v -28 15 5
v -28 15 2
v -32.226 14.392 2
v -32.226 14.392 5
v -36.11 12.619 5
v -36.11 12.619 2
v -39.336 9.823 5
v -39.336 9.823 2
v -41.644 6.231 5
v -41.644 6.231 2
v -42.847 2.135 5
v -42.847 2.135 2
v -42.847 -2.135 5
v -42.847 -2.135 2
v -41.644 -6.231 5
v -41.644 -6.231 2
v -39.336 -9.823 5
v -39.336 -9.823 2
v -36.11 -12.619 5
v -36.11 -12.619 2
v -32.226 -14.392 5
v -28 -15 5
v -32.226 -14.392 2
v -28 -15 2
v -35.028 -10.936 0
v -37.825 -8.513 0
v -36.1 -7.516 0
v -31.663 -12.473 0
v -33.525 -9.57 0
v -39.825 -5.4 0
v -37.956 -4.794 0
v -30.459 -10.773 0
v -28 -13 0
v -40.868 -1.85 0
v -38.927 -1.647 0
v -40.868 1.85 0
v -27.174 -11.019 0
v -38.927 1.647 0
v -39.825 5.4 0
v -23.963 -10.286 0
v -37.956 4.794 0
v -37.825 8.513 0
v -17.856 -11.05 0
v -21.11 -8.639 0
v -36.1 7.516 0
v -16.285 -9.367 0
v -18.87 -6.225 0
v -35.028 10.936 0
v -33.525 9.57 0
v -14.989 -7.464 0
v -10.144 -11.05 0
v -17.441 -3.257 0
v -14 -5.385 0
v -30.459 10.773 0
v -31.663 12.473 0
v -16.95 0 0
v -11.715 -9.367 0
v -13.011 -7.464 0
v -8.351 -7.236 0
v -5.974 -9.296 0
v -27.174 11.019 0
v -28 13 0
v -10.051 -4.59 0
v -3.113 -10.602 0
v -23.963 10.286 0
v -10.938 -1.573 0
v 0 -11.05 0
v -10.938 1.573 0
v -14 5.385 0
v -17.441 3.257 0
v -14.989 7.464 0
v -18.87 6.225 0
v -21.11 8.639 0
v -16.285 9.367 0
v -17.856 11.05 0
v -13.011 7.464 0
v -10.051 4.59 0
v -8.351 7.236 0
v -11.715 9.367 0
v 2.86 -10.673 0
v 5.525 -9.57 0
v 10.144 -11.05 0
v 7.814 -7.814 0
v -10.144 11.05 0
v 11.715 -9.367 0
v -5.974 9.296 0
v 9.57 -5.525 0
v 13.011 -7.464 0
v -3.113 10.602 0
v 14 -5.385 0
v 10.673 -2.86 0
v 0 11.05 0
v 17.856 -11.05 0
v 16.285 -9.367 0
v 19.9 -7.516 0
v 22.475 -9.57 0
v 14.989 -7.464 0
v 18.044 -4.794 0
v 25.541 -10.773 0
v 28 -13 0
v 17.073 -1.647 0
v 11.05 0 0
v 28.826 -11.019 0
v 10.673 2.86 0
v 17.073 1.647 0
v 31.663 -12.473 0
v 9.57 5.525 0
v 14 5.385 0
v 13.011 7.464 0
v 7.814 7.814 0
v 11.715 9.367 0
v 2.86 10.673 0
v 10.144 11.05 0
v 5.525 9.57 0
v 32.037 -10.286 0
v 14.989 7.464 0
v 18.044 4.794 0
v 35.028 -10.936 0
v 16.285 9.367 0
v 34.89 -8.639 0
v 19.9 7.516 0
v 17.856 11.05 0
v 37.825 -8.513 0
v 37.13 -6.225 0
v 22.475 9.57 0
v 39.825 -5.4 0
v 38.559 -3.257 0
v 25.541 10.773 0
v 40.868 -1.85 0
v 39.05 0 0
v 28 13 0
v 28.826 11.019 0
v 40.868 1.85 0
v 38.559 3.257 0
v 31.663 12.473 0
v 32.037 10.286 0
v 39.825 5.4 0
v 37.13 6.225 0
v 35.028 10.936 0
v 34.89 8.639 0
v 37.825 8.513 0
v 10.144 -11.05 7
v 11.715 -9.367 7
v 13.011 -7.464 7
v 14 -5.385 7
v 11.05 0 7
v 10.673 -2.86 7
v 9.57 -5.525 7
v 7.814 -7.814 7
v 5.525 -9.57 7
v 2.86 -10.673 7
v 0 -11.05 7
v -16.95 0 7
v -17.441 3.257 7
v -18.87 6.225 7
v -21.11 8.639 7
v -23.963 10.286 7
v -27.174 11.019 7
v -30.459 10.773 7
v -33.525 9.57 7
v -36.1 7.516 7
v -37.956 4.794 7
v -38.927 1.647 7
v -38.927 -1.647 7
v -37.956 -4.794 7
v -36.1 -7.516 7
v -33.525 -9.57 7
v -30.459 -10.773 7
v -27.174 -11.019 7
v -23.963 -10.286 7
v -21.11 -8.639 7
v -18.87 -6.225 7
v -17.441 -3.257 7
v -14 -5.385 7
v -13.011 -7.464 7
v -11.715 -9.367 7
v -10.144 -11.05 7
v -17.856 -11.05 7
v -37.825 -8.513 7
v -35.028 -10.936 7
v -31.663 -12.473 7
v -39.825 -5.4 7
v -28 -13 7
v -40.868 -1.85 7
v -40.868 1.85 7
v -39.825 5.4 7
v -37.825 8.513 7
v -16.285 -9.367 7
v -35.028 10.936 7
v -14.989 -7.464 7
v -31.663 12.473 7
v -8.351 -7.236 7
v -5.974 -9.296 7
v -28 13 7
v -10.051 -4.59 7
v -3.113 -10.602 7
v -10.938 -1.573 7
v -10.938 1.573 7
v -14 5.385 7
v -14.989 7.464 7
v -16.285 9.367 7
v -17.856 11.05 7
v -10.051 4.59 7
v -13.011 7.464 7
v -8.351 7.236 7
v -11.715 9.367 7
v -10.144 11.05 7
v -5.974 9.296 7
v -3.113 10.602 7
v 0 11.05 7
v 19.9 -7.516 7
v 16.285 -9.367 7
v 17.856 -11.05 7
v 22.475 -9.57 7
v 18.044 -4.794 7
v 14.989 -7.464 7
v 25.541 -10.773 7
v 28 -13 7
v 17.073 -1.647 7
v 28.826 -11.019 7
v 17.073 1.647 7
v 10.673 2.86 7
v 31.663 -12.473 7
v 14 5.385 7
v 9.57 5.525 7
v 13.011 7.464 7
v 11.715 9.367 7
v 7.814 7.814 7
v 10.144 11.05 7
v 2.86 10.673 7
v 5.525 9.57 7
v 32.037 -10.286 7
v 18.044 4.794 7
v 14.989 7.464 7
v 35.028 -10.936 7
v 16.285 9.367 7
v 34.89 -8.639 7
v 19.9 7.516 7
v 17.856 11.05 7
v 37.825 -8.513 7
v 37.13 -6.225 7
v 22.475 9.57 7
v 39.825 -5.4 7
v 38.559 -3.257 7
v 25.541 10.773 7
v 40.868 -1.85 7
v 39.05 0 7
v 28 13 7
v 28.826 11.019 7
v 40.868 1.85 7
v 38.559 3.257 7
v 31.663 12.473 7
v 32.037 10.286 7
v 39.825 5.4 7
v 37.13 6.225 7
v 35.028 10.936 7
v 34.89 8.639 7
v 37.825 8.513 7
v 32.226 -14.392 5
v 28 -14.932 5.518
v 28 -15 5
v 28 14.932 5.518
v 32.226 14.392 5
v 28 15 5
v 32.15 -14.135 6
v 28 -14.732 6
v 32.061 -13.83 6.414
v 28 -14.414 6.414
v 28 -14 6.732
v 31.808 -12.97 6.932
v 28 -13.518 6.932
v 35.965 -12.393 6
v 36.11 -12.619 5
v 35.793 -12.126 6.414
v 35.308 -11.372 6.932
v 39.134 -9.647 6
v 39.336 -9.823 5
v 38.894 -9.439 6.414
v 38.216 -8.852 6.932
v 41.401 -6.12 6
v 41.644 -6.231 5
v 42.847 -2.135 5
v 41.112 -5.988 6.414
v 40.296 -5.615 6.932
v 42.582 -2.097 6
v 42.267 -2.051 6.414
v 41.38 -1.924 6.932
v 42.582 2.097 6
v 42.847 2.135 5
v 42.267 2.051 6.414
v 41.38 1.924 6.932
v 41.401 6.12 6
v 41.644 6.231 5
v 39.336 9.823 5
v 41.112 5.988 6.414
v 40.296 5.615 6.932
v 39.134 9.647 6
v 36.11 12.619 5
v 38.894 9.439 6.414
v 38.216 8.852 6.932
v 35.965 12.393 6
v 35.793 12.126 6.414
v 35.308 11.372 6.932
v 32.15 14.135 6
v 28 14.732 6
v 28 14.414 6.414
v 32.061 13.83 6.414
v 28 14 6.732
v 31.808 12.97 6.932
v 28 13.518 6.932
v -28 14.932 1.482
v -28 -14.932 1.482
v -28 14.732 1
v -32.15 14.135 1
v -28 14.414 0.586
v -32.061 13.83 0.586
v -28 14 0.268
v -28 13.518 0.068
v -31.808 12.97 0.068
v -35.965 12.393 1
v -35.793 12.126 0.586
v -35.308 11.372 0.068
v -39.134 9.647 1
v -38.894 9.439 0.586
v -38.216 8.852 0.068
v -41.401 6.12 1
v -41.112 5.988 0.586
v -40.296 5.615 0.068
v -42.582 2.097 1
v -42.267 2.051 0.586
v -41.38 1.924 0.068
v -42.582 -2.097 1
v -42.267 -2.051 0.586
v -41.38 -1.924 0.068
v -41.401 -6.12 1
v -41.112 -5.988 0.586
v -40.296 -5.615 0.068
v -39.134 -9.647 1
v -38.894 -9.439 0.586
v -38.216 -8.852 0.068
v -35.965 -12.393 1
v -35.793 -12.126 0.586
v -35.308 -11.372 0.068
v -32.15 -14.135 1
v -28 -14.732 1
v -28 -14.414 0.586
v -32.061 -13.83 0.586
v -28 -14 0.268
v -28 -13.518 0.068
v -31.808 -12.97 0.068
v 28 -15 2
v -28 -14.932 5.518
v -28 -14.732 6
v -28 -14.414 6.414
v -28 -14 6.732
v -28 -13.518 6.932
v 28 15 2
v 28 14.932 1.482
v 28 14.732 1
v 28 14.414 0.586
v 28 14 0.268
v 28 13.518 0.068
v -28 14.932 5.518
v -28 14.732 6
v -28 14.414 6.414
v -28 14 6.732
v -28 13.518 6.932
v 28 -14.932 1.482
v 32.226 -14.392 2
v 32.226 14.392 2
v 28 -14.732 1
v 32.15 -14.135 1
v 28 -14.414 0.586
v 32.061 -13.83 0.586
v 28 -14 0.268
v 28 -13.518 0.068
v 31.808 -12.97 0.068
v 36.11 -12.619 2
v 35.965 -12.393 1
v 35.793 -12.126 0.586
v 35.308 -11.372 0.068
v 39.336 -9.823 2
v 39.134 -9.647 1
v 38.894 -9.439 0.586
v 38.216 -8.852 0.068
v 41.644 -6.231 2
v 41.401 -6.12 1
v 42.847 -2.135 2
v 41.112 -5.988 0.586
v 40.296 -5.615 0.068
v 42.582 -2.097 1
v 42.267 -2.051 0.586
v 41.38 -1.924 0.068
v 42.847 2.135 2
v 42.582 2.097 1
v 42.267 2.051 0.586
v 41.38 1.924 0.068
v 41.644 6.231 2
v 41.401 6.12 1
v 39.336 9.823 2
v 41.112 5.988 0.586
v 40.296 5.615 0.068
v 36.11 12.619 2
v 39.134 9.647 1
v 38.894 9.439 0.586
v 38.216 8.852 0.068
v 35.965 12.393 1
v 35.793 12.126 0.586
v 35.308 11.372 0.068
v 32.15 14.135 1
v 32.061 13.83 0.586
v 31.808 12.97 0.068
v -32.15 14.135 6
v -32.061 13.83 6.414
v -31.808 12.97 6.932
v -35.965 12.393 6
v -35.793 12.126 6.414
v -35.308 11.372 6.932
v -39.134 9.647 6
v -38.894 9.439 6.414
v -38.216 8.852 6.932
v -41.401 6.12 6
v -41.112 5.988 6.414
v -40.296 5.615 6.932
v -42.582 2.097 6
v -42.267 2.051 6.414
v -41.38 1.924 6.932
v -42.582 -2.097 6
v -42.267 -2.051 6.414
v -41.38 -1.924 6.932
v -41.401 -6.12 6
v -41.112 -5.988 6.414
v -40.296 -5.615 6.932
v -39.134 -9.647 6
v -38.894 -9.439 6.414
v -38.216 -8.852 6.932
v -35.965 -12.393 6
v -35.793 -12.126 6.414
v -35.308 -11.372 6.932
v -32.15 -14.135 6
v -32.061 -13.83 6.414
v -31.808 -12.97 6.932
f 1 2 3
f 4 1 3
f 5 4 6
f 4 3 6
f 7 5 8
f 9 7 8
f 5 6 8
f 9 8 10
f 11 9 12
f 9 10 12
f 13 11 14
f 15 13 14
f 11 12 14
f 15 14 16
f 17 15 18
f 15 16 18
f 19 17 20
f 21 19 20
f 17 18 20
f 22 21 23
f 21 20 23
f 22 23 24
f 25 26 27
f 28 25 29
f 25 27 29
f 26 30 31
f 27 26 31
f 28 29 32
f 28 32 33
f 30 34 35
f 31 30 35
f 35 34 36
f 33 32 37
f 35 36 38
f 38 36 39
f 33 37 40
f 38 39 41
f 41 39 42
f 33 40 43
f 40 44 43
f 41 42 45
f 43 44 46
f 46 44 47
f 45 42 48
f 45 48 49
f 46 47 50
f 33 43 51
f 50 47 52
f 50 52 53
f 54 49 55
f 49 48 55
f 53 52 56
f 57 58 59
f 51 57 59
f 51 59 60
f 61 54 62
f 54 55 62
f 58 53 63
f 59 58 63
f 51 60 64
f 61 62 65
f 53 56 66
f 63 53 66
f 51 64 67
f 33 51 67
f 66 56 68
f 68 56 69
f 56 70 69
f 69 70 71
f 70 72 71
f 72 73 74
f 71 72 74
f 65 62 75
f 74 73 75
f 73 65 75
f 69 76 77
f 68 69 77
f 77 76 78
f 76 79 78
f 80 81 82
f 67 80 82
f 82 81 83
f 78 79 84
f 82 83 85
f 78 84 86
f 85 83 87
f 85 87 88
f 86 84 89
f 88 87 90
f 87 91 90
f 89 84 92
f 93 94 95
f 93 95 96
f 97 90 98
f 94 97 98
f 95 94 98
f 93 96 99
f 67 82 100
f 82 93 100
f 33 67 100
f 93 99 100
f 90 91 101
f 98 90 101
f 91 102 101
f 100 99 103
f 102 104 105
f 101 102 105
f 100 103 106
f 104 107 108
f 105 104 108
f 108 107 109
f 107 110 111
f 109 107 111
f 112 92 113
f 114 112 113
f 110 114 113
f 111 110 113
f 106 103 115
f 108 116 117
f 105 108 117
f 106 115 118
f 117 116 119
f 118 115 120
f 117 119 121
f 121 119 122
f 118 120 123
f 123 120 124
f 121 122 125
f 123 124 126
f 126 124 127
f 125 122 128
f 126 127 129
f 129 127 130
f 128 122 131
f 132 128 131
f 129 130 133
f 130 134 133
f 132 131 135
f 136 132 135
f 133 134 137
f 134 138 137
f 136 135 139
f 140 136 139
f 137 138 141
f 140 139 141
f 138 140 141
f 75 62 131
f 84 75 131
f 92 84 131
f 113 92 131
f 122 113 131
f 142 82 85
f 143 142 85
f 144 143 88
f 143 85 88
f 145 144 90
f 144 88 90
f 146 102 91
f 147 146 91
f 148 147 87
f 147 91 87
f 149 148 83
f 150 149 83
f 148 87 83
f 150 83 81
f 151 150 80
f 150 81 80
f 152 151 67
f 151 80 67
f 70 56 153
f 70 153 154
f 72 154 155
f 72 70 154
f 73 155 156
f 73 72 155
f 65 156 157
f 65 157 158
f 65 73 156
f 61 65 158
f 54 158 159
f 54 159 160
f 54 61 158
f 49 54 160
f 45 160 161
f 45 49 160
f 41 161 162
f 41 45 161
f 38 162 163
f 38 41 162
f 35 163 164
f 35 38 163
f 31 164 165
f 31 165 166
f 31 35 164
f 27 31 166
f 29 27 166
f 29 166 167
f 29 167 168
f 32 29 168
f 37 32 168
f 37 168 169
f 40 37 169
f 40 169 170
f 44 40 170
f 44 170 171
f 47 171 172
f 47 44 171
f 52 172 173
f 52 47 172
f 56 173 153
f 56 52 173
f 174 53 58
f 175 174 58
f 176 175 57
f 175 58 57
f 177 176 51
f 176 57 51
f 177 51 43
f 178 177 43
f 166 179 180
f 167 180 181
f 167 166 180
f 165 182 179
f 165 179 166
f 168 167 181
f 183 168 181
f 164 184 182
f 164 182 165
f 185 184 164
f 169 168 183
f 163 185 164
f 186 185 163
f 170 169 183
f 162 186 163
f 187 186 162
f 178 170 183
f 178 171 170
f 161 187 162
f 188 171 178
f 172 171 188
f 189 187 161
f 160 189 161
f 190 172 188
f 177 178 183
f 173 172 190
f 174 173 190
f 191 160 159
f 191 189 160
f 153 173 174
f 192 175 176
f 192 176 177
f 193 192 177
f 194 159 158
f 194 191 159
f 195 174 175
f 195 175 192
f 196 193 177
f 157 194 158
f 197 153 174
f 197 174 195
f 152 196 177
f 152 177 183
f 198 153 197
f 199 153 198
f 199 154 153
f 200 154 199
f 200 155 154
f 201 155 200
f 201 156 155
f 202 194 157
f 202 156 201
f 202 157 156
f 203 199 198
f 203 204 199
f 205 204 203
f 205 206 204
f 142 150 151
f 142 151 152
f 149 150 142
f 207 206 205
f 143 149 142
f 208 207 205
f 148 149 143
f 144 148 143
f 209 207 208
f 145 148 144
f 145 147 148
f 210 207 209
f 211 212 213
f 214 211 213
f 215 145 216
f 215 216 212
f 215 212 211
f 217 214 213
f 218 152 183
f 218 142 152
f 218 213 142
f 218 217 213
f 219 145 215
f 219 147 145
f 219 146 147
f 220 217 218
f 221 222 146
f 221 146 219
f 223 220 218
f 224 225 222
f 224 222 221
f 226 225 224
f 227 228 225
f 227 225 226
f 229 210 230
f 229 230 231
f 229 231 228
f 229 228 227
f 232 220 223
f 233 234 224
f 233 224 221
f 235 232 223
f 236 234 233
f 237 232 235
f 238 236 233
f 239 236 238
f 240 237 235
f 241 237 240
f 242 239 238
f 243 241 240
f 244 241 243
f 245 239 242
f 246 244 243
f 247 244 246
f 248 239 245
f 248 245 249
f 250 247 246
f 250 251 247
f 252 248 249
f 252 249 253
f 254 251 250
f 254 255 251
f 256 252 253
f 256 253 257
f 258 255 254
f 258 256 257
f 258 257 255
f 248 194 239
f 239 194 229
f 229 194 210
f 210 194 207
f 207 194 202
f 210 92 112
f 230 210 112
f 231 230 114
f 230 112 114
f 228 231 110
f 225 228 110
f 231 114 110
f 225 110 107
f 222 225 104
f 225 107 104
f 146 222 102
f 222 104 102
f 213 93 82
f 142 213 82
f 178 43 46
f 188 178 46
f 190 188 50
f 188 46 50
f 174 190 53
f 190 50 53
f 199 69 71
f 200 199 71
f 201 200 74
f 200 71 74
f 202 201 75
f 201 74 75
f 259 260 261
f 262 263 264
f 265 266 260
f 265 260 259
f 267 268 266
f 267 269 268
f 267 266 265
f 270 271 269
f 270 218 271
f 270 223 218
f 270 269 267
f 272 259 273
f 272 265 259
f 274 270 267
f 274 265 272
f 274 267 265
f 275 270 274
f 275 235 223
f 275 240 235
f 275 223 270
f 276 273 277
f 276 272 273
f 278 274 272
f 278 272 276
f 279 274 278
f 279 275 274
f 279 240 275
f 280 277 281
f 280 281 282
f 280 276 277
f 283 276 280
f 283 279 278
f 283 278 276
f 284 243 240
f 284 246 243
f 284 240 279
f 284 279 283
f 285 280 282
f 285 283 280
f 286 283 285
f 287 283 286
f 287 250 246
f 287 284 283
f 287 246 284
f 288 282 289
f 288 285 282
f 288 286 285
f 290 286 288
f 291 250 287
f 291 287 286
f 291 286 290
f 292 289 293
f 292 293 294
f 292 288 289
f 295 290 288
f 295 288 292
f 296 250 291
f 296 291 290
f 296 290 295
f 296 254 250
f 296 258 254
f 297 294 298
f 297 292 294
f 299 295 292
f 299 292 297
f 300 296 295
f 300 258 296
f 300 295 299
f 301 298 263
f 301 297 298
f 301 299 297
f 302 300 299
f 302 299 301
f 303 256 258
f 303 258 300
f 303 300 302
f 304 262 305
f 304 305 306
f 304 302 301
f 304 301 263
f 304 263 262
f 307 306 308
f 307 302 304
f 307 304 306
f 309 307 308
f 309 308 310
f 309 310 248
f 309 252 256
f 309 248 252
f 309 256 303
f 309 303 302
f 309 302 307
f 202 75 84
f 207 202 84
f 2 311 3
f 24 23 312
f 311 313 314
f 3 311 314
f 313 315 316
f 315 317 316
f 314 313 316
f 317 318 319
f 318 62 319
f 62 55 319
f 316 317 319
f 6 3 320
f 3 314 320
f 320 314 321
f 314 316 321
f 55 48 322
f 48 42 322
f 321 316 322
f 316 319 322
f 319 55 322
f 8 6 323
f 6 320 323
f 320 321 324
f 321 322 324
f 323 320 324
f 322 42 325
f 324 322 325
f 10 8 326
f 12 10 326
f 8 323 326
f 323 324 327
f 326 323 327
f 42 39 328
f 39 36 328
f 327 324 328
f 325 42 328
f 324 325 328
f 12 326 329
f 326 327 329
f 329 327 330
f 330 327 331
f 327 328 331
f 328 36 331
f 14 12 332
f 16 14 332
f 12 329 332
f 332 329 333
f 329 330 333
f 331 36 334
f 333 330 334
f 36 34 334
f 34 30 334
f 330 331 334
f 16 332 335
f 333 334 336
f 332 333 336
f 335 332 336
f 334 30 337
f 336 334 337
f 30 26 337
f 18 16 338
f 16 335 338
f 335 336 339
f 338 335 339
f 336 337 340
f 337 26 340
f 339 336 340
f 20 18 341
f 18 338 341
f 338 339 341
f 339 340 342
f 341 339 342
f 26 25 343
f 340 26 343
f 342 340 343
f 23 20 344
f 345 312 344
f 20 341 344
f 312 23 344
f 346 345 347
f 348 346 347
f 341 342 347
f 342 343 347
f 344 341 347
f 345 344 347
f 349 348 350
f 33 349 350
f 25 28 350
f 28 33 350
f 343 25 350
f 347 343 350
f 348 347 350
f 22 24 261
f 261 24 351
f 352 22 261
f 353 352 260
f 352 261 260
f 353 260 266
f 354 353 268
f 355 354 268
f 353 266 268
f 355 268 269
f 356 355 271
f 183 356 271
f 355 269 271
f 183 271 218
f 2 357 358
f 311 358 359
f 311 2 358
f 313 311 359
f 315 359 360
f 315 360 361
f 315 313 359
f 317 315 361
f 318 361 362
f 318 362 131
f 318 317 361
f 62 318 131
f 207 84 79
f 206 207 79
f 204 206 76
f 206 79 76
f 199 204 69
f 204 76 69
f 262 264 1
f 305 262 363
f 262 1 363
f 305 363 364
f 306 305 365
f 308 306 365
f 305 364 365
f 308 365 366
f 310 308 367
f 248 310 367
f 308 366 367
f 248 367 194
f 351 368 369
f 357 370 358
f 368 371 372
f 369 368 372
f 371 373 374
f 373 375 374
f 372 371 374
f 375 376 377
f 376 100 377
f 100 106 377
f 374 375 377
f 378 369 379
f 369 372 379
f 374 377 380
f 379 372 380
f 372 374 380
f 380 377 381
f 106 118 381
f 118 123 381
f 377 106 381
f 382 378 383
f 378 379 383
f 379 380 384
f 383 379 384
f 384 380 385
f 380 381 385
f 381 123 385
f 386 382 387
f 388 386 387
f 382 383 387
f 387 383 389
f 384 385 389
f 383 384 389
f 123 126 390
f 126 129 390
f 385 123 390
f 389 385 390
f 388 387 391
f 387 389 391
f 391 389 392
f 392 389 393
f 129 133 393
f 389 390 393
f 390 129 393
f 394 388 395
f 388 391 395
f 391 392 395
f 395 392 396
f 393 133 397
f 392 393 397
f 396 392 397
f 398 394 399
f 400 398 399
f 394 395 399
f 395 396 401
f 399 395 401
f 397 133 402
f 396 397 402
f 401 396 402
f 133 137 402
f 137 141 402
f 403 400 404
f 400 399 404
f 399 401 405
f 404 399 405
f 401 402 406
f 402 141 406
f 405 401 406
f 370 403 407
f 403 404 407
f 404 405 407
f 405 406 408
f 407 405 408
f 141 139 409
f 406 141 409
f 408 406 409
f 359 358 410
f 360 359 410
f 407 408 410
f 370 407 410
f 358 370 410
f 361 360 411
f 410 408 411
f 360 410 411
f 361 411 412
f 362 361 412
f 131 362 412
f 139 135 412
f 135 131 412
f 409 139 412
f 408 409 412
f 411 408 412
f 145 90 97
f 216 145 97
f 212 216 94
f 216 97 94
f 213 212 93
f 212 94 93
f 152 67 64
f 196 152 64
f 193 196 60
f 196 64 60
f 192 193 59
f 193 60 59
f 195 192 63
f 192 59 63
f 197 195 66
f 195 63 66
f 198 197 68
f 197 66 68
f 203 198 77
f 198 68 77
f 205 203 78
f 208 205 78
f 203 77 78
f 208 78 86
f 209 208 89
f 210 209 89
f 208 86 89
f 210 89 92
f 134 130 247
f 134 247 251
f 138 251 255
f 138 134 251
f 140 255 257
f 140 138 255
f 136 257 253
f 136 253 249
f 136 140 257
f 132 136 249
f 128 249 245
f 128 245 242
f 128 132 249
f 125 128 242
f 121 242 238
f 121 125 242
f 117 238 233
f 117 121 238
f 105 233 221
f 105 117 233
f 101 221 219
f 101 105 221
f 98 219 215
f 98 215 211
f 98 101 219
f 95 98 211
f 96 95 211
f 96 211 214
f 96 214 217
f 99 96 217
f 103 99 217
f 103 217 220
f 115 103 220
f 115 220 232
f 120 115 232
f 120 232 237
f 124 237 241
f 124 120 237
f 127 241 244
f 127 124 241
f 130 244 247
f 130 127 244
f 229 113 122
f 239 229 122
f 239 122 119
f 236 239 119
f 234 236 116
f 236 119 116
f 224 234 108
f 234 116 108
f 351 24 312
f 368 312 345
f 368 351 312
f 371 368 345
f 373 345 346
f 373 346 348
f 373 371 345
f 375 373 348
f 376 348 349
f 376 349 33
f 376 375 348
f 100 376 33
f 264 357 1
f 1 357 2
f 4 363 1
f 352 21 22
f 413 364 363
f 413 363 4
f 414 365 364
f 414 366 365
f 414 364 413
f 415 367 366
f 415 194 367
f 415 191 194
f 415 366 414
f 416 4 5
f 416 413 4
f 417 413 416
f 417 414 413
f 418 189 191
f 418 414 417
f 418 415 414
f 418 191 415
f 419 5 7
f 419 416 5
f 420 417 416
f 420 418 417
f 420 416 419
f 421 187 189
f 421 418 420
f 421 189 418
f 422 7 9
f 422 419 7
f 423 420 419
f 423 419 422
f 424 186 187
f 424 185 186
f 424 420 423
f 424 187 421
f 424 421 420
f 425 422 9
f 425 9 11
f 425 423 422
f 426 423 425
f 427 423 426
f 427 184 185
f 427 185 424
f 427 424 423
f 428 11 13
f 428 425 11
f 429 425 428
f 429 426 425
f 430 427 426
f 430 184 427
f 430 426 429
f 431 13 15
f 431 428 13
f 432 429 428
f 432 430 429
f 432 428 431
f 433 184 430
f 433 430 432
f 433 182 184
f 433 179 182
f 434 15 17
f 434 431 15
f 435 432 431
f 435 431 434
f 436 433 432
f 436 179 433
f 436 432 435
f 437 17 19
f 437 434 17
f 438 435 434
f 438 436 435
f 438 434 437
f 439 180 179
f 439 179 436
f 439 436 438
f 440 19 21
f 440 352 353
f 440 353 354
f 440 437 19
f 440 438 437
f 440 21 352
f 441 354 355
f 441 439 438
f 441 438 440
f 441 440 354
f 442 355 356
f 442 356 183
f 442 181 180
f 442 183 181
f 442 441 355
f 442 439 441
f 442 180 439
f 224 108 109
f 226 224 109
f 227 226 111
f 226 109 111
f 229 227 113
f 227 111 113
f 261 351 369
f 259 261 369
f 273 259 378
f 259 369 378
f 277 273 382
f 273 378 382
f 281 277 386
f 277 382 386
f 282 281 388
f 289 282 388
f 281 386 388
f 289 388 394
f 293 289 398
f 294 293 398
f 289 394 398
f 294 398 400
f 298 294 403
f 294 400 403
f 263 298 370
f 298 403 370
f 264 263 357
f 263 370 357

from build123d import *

# Parameters (mm, degrees)
F0_R     = 11.05
F1_DEPTH = 7
F2_R     = 2


with BuildPart() as f1:
    # F0 (on Top) → F1 (new body)
    with BuildSketch(Plane.XY):
        with BuildLine():
            Line((-10.1438404956, 11.05), (0, 11.05))
            Line((0, 11.05), (10.1438404956, 11.05))
            ThreePointArc((10.1438404956, 11.05), (5.4428852643, 13.9776607485), (0, 15))
            ThreePointArc((0, 15), (-5.4428852643, 13.9776607485), (-10.1438404956, 11.05))
        make_face()
        with BuildLine():
            Line((10.1438404956, -11.05), (0, -11.05))
            Line((0, -11.05), (-10.1438404956, -11.05))
            ThreePointArc((-10.1438404956, -11.05), (-5.442885249, -13.9776607544), (3.27e-08, -15))
            ThreePointArc((3.27e-08, -15), (5.4428852795, -13.9776607426), (10.1438404956, -11.05))
        make_face()
        with BuildLine():
            Line((-17.8561595044, 11.05), (-10.1438404956, 11.05))
            ThreePointArc((-10.1438404956, 11.05), (-5.4428852643, 13.9776607485), (0, 15))
            Line((0, 15), (-28, 15))
            ThreePointArc((-28, 15), (-22.5571147357, 13.9776607485), (-17.8561595044, 11.05))
        make_face()
        with BuildLine():
            ThreePointArc((0, 15), (5.4428852643, 13.9776607485), (10.1438404956, 11.05))
            Line((10.1438404956, 11.05), (17.8561595044, 11.05))
            ThreePointArc((17.8561595044, 11.05), (22.5571147357, 13.9776607485), (28, 15))
            Line((28, 15), (0, 15))
        make_face()
        with BuildLine():
            ThreePointArc((3.27e-08, -15), (-5.442885249, -13.9776607544), (-10.1438404956, -11.05))
            Line((-10.1438404956, -11.05), (-17.8561595044, -11.05))
            ThreePointArc((-17.8561595044, -11.05), (-22.5571147357, -13.9776607485), (-28, -15))
            Line((-28, -15), (3.27e-08, -15))
        make_face()
        with BuildLine():
            Line((17.8561595044, -11.05), (10.1438404956, -11.05))
            ThreePointArc((10.1438404956, -11.05), (5.4428852795, -13.9776607426), (3.27e-08, -15))
            Line((3.27e-08, -15), (28, -15))
            ThreePointArc((28, -15), (22.5571147357, -13.9776607485), (17.8561595044, -11.05))
        make_face()
        with BuildLine():
            ThreePointArc((-14, -5.3851648071), (-15, 0), (-14, 5.3851648071))
            ThreePointArc((-14, 5.3851648071), (-15.6002480706, 8.4407435745), (-17.8561595044, 11.05))
            ThreePointArc((-17.8561595044, 11.05), (-22.5571147357, 13.9776607485), (-28, 15))
            ThreePointArc((-28, 15), (-43, 0), (-28, -15))
            ThreePointArc((-28, -15), (-22.5571147357, -13.9776607485), (-17.8561595044, -11.05))
            ThreePointArc((-17.8561595044, -11.05), (-15.6002480706, -8.4407435745), (-14, -5.3851648071))
        make_face()
        with Locations((-28, 0)):
            Circle(F0_R, mode=Mode.SUBTRACT)
        with BuildLine():
            ThreePointArc((17.8561595044, 11.05), (15.6002480706, 8.4407435745), (14, 5.3851648071))
            ThreePointArc((14, 5.3851648071), (14.7478812038, 2.7386127875), (15, 0))
            ThreePointArc((15, 0), (14.7478812038, -2.7386127875), (14, -5.3851648071))
            ThreePointArc((14, -5.3851648071), (15.6002480706, -8.4407435745), (17.8561595044, -11.05))
            ThreePointArc((17.8561595044, -11.05), (22.5571147357, -13.9776607485), (28, -15))
            ThreePointArc((28, -15), (38.6066017178, -10.6066017178), (43, 0))
            ThreePointArc((43, 0), (38.6066017178, 10.6066017178), (28, 15))
            ThreePointArc((28, 15), (22.5571147357, 13.9776607485), (17.8561595044, 11.05))
        make_face()
        with Locations((28, 0)):
            Circle(F0_R, mode=Mode.SUBTRACT)
        with BuildLine():
            ThreePointArc((-13, 0), (-13.2521187962, 2.7386127875), (-14, 5.3851648071))
            ThreePointArc((-14, 5.3851648071), (-15, 0), (-14, -5.3851648071))
            ThreePointArc((-14, -5.3851648071), (-13.2521187962, -2.7386127875), (-13, 0))
        make_face()
        with BuildLine():
            ThreePointArc((0, -11.05), (-11.05, 0), (0, 11.05))
            Line((0, 11.05), (-10.1438404956, 11.05))
            ThreePointArc((-10.1438404956, 11.05), (-12.3997519294, 8.4407435745), (-14, 5.3851648071))
            ThreePointArc((-14, 5.3851648071), (-13.2521187962, 2.7386127875), (-13, 0))
            ThreePointArc((-13, 0), (-13.2521187962, -2.7386127875), (-14, -5.3851648071))
            ThreePointArc((-14, -5.3851648071), (-12.3997519294, -8.4407435745), (-10.1438404956, -11.05))
            Line((-10.1438404956, -11.05), (0, -11.05))
        make_face()
        with BuildLine():
            ThreePointArc((0, 11.05), (7.8135299321, 7.8135299321), (11.05, 0))
            ThreePointArc((11.05, 0), (7.8135299321, -7.8135299321), (0, -11.05))
            Line((0, -11.05), (10.1438404956, -11.05))
            ThreePointArc((10.1438404956, -11.05), (12.3997519294, -8.4407435745), (14, -5.3851648071))
            ThreePointArc((14, -5.3851648071), (13, 0), (14, 5.3851648071))
            ThreePointArc((14, 5.3851648071), (12.3997519294, 8.4407435745), (10.1438404956, 11.05))
            Line((10.1438404956, 11.05), (0, 11.05))
        make_face()
        with BuildLine():
            ThreePointArc((15, 0), (14.7478812038, 2.7386127875), (14, 5.3851648071))
            ThreePointArc((14, 5.3851648071), (13, 0), (14, -5.3851648071))
            ThreePointArc((14, -5.3851648071), (14.7478812038, -2.7386127875), (15, 0))
        make_face()
    extrude(amount=F1_DEPTH)

    # F2
    f2_edges = [f1.edges().sort_by_distance(p)[0] for p in [
        (0, 15, 7),
        (0, -15, 0),
    ]]
    fillet(f2_edges, radius=F2_R)


solid = f1.part
